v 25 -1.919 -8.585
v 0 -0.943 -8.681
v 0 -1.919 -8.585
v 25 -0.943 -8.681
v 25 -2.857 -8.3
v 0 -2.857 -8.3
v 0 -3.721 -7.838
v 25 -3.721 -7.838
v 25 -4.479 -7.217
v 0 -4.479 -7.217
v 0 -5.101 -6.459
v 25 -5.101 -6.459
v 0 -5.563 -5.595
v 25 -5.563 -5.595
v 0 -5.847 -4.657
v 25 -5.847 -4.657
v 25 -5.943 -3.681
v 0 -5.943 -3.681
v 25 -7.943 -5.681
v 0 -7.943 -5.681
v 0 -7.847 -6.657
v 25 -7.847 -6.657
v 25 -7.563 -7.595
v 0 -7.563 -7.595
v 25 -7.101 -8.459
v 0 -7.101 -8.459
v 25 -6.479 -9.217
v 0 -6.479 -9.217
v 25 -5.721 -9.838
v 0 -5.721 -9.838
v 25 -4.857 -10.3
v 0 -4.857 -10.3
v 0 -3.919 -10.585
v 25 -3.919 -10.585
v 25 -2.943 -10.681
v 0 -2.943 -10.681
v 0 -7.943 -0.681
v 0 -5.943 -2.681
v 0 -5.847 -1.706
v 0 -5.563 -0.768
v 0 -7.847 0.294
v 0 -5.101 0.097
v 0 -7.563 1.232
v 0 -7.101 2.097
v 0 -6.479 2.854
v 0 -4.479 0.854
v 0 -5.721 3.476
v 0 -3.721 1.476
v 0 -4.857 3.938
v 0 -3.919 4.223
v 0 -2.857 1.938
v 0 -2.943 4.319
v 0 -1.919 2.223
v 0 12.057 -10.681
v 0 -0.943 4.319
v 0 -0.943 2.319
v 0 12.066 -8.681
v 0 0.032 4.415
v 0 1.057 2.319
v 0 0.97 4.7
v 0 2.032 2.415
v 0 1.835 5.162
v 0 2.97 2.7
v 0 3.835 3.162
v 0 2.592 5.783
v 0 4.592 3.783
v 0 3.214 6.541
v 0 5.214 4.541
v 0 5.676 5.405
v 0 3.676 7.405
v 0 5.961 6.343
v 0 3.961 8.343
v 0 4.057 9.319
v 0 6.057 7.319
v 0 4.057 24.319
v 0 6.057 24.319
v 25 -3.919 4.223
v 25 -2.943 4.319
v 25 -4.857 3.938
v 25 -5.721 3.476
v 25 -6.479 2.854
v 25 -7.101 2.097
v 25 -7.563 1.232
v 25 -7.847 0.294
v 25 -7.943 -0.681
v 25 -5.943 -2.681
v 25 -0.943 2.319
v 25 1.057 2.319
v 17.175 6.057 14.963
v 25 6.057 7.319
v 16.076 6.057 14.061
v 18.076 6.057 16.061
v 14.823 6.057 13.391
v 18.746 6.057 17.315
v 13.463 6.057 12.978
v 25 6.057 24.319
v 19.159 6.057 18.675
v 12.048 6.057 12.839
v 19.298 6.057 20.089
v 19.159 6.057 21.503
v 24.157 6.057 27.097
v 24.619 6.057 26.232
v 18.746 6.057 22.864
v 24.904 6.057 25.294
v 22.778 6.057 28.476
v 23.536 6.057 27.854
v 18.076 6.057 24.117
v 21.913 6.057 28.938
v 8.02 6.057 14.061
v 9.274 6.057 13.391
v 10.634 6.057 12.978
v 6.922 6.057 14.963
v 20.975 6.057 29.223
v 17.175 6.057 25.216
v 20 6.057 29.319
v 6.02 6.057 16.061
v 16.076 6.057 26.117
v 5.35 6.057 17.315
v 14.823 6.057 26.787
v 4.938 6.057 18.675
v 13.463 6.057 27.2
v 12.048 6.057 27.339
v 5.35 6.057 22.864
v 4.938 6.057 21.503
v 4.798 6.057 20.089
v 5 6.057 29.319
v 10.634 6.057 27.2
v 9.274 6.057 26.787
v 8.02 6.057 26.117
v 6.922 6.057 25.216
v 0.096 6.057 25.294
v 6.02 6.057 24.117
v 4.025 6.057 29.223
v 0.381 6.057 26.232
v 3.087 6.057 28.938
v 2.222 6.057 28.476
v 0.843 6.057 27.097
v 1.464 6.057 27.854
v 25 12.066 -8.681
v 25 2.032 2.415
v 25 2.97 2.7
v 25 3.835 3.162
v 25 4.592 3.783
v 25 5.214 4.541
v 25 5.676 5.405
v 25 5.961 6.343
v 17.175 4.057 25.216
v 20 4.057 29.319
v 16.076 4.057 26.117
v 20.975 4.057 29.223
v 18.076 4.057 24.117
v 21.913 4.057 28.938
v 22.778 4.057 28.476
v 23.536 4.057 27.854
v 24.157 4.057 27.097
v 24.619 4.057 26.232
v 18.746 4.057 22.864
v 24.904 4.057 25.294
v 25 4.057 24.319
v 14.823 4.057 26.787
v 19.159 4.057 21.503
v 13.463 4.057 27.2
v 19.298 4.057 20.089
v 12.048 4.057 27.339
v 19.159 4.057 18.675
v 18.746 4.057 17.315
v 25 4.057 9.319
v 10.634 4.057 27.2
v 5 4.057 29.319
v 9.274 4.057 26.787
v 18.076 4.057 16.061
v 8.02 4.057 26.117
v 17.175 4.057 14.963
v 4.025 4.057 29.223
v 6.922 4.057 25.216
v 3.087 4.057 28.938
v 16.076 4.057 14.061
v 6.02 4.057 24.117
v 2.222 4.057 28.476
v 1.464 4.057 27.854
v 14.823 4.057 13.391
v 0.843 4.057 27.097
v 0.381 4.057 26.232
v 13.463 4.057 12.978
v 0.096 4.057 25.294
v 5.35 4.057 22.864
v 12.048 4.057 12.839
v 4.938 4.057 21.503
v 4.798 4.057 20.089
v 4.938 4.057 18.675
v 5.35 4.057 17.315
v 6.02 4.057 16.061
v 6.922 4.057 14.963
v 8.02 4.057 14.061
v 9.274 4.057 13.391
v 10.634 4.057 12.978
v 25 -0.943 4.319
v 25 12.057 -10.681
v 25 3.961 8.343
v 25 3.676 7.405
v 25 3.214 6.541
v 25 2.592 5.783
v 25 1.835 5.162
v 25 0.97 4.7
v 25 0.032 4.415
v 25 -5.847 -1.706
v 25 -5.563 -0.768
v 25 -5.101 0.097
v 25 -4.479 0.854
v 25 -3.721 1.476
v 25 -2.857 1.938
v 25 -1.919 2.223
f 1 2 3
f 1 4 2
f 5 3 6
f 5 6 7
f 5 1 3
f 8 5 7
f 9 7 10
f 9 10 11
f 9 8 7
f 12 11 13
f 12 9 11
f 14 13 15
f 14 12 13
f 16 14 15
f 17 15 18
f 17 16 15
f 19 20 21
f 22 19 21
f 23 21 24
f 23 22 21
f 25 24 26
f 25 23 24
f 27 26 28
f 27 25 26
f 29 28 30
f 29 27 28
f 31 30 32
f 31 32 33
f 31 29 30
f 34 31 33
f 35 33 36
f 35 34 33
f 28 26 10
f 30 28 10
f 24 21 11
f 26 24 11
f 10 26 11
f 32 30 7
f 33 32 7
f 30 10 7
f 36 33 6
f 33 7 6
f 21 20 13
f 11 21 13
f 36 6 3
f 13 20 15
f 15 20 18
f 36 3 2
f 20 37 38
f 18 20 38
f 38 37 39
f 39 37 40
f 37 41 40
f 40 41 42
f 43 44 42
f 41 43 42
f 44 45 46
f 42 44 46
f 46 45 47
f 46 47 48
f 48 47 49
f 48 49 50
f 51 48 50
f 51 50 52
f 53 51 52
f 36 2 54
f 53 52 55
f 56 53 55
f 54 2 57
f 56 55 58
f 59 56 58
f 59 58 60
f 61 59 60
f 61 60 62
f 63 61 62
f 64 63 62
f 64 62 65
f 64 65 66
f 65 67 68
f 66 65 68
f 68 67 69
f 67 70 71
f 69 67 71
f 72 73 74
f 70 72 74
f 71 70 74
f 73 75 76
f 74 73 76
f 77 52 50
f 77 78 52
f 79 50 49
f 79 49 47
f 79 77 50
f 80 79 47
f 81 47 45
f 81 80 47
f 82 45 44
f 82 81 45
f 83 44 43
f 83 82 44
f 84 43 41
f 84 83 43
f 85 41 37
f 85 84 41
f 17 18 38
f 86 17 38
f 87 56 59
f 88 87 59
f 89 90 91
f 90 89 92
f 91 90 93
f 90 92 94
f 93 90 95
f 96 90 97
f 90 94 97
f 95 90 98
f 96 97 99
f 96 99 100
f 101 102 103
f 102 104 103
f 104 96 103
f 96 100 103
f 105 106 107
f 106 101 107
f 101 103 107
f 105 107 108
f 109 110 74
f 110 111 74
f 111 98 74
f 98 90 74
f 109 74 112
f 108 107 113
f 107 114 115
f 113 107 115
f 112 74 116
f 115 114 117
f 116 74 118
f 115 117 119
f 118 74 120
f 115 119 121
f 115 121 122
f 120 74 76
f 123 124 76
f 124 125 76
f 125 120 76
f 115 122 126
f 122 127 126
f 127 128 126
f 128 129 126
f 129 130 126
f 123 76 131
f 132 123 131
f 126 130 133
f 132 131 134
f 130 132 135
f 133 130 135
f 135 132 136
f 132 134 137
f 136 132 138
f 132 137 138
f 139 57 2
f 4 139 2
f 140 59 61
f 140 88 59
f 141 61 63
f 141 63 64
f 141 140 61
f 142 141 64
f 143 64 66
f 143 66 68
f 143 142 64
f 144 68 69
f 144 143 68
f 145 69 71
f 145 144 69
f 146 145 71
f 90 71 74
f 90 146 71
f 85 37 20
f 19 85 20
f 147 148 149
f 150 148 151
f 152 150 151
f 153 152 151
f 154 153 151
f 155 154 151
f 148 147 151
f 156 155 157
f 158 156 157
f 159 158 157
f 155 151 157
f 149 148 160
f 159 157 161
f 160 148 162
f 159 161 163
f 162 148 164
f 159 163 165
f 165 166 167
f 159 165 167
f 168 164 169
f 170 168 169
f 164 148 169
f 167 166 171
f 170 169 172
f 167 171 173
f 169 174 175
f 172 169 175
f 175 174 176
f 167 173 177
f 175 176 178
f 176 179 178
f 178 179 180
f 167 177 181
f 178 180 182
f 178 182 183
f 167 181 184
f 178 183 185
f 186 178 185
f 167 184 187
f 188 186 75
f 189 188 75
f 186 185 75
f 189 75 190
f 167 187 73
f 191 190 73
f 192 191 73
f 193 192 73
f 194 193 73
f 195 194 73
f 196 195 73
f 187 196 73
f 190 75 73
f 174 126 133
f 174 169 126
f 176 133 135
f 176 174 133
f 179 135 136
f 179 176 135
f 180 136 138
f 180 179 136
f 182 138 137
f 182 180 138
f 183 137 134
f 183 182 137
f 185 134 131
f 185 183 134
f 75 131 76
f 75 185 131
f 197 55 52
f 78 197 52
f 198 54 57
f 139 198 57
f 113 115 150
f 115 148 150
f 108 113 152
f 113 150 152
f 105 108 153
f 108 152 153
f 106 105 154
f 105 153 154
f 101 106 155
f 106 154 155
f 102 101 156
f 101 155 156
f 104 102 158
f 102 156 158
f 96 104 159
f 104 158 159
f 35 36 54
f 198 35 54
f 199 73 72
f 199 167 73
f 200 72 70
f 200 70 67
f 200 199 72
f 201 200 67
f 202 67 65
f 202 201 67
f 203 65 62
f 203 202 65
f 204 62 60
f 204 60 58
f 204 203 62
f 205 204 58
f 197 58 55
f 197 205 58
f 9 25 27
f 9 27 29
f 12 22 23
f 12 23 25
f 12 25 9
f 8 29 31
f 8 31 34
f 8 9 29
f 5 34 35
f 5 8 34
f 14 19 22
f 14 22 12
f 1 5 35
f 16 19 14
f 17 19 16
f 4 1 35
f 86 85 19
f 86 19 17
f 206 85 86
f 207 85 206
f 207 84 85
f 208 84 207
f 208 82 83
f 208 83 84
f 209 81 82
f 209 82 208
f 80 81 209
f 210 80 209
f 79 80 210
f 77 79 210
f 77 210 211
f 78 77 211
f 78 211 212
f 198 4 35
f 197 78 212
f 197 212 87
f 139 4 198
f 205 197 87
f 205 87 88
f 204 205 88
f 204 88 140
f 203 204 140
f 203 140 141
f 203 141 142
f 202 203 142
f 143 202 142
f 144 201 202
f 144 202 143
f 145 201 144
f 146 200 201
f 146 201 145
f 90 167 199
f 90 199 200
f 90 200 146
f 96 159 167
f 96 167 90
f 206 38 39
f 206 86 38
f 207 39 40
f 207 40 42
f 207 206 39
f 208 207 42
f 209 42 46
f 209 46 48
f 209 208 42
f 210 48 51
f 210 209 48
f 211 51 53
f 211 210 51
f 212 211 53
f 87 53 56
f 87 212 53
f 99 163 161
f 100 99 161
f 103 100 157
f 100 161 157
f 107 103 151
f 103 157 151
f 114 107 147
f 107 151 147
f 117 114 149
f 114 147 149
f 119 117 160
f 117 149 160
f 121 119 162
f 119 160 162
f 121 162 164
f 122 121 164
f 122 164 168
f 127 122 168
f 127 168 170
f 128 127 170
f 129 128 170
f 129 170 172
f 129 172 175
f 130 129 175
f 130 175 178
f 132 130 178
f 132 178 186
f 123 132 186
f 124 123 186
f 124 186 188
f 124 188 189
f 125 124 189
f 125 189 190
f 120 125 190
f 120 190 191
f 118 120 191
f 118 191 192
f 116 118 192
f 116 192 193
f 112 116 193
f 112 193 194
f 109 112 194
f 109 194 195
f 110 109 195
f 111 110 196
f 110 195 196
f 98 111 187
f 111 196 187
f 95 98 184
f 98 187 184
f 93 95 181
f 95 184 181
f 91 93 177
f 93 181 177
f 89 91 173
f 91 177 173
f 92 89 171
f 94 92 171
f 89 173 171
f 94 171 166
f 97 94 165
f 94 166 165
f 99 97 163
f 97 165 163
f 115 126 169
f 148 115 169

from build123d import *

# Parameters (mm, degrees)
F1_DEPTH = 25
F2_R     = 5
F3_R     = 7.25
F4_DEPTH = 25


with BuildPart() as f1:
    # F0 (on Right) → F1 (new body)
    with BuildSketch(Plane.YZ):
        Polygon((6.056661, 29.318909), (4.056661, 29.318909), (4.056661, 4.318909), (-7.943339, 4.318909), (-7.943339, -10.681091), (12.056661, -10.681091), (12.06602, -8.681091), (-5.943339, -8.681091), (-5.943339, 2.318909), (6.056661, 2.318909), align=None)
    extrude(amount=F1_DEPTH)

    # F2
    f2_edges = [f1.edges().sort_by_distance(p)[0] for p in [
        (12.5, 4.056661, 4.318909),
        (12.5, -7.943339, 4.318909),
        (12.5, -7.943339, -10.681091),
        (12.5, -5.943339, 2.318909),
        (12.5, -5.943339, -8.681091),
        (12.5, 6.056661, 2.318909),
        (25, 5.056661, 29.318909),
        (0, 5.056661, 29.318909),
    ]]
    fillet(f2_edges, radius=F2_R)

    # F3 (on Front) → F4 (cut)
    with BuildSketch(Plane.XZ):
        with Locations((12.048211, 20.089075)):
            Circle(F3_R)
    extrude(amount=-F4_DEPTH, mode=Mode.SUBTRACT)


solid = f1.part
